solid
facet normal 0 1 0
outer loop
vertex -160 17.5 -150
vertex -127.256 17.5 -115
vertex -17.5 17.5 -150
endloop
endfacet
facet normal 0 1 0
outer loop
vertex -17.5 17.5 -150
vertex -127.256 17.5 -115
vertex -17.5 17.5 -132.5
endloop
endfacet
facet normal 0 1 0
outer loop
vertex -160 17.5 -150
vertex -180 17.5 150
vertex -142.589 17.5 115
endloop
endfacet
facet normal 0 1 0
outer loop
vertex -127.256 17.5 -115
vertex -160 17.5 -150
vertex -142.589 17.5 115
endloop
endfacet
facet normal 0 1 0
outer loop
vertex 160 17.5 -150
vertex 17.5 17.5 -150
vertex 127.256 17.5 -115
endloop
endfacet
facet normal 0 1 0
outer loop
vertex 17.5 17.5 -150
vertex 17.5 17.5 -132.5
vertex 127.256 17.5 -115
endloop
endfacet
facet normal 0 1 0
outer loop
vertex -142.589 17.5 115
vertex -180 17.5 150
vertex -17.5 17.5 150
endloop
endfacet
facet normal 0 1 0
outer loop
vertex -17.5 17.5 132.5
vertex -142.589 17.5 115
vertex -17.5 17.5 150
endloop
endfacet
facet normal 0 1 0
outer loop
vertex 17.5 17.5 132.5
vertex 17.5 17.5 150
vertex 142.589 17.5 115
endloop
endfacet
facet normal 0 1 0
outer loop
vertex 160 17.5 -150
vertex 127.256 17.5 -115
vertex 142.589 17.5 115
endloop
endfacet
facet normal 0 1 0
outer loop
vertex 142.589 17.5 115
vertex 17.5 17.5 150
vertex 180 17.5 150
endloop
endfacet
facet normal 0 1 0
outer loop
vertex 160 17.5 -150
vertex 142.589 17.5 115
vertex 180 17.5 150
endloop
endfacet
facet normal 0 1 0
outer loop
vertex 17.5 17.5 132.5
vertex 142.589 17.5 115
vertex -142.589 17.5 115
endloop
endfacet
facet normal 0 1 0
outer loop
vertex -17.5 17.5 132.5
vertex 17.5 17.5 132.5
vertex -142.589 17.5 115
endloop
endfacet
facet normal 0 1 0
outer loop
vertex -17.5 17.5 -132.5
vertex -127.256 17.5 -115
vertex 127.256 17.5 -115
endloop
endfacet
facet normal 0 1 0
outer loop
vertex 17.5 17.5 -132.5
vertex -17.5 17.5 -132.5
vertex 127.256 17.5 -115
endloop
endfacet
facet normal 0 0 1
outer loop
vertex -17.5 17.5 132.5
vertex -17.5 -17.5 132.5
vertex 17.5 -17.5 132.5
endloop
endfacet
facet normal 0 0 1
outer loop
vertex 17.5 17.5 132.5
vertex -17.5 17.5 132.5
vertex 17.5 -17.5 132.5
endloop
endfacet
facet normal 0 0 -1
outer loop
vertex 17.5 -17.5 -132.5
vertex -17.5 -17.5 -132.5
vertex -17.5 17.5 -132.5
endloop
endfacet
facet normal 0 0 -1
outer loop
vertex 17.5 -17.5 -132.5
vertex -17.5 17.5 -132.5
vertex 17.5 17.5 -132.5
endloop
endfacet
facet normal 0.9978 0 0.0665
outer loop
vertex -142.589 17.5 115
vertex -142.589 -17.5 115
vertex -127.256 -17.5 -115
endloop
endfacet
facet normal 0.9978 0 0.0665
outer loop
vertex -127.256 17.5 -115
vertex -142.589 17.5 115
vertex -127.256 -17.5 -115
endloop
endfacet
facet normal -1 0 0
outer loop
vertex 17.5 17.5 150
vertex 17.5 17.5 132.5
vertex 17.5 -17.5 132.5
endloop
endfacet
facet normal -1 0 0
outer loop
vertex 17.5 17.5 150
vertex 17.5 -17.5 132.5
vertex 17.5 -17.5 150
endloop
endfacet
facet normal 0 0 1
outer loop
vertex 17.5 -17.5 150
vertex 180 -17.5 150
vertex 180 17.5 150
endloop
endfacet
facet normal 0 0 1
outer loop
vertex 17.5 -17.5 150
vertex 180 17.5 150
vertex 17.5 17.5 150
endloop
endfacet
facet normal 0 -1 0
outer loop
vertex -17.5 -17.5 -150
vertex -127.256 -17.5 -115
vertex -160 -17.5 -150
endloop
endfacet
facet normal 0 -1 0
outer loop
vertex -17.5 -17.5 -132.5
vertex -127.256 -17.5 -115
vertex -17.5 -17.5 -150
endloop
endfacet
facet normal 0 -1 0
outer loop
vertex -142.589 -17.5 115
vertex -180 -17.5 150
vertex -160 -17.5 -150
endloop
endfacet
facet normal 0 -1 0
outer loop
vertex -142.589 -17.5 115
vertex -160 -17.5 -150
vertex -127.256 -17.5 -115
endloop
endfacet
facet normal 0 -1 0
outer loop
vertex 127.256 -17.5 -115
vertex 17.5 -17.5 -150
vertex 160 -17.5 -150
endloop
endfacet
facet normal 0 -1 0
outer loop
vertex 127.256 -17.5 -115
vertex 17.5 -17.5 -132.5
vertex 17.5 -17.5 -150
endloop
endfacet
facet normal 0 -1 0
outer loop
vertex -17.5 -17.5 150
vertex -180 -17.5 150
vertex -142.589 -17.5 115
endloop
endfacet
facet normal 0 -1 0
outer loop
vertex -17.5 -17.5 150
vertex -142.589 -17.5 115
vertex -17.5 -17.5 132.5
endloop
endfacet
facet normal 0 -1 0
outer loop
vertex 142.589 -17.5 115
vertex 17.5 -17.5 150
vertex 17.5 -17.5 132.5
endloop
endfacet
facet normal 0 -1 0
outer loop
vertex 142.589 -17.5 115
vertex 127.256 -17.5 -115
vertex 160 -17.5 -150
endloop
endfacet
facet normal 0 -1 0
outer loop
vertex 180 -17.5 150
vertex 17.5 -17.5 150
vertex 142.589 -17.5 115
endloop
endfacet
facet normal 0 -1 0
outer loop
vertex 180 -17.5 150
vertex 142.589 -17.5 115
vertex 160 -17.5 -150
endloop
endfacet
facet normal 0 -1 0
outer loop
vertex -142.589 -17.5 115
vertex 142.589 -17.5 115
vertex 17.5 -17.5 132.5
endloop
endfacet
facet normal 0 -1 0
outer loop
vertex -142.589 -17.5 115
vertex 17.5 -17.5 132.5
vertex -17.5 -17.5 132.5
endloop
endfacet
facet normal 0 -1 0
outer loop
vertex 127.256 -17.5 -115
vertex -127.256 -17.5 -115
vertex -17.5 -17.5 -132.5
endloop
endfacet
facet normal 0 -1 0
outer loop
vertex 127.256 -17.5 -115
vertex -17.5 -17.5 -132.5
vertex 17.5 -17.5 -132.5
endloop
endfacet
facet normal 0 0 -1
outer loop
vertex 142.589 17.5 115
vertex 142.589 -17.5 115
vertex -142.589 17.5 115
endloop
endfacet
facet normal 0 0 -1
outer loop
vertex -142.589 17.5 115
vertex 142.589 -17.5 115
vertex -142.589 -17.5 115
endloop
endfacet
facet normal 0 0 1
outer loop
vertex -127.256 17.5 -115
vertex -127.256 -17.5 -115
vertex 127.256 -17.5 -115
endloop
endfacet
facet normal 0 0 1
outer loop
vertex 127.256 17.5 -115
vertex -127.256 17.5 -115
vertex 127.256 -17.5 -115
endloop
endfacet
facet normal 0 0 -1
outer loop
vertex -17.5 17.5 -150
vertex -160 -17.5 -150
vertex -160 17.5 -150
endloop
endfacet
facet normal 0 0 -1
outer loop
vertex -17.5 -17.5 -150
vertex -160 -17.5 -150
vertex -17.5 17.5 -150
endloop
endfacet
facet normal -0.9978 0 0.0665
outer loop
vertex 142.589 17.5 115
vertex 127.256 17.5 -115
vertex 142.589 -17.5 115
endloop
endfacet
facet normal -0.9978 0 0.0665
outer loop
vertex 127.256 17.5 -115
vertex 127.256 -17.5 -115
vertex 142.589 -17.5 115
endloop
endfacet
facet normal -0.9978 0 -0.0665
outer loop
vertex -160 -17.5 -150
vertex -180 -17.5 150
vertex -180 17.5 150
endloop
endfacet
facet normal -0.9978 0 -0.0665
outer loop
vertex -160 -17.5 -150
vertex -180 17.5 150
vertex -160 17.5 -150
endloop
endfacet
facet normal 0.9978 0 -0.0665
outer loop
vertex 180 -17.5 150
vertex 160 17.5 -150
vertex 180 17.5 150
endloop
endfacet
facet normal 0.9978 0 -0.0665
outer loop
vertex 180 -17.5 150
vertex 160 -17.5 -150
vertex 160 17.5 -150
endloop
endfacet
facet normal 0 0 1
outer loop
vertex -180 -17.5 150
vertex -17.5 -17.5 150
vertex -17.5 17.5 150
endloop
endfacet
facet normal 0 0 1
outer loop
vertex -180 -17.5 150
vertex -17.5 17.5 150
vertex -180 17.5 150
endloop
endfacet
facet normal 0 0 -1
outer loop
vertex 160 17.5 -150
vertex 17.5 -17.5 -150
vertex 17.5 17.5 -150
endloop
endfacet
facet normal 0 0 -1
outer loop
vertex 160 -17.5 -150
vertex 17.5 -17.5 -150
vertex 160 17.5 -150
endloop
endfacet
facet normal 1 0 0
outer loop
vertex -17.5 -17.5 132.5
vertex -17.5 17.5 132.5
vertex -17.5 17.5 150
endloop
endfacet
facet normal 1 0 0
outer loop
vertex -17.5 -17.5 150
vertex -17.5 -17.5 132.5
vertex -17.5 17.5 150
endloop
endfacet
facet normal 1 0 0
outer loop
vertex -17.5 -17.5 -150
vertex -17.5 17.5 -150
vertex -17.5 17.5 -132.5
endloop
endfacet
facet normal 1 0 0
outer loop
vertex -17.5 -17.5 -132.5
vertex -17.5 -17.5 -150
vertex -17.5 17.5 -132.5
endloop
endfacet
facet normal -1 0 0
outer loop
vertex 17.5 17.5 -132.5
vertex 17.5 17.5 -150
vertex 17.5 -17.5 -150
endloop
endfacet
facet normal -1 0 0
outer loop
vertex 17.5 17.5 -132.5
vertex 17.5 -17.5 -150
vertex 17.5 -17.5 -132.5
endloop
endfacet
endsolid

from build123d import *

# Parameters (mm, degrees)
F2_DEPTH = 17.5
F3_DEPTH = 17.5
F4_W     = 35
F4_H     = 17.5
F5_DEPTH = 35
F6_W     = 35
F6_H     = 17.5
F7_DEPTH = 35


with BuildPart() as f2:
    # F0 (on Front) → F2 (new body, symmetric)
    with BuildSketch(Plane.XZ):
        Polygon((180, 150), (-180, 150), (-160, -150), (160, -150), align=None)
    extrude(amount=F2_DEPTH, both=True)

    # F1 (on face) → F3 (cut, symmetric)
    with BuildSketch(Plane.XZ):
        Polygon((142.588975, 115), (-142.588975, 115), (-127.255642, -115), (127.255642, -115), align=None)
    extrude(amount=F3_DEPTH, both=True, mode=Mode.SUBTRACT)

    # F4 (on face) → F5 (cut)
    with BuildSketch(Plane.XZ.offset(17.5)):
        with Locations((0, -141.25)):
            Rectangle(F4_W, F4_H)
    extrude(amount=-F5_DEPTH, mode=Mode.SUBTRACT)

    # F6 (on face) → F7 (cut)
    with BuildSketch(Plane.XZ.offset(17.5)):
        with Locations((0, 141.25)):
            Rectangle(F6_W, F6_H)
    extrude(amount=-F7_DEPTH, mode=Mode.SUBTRACT)


solid = f2.part
